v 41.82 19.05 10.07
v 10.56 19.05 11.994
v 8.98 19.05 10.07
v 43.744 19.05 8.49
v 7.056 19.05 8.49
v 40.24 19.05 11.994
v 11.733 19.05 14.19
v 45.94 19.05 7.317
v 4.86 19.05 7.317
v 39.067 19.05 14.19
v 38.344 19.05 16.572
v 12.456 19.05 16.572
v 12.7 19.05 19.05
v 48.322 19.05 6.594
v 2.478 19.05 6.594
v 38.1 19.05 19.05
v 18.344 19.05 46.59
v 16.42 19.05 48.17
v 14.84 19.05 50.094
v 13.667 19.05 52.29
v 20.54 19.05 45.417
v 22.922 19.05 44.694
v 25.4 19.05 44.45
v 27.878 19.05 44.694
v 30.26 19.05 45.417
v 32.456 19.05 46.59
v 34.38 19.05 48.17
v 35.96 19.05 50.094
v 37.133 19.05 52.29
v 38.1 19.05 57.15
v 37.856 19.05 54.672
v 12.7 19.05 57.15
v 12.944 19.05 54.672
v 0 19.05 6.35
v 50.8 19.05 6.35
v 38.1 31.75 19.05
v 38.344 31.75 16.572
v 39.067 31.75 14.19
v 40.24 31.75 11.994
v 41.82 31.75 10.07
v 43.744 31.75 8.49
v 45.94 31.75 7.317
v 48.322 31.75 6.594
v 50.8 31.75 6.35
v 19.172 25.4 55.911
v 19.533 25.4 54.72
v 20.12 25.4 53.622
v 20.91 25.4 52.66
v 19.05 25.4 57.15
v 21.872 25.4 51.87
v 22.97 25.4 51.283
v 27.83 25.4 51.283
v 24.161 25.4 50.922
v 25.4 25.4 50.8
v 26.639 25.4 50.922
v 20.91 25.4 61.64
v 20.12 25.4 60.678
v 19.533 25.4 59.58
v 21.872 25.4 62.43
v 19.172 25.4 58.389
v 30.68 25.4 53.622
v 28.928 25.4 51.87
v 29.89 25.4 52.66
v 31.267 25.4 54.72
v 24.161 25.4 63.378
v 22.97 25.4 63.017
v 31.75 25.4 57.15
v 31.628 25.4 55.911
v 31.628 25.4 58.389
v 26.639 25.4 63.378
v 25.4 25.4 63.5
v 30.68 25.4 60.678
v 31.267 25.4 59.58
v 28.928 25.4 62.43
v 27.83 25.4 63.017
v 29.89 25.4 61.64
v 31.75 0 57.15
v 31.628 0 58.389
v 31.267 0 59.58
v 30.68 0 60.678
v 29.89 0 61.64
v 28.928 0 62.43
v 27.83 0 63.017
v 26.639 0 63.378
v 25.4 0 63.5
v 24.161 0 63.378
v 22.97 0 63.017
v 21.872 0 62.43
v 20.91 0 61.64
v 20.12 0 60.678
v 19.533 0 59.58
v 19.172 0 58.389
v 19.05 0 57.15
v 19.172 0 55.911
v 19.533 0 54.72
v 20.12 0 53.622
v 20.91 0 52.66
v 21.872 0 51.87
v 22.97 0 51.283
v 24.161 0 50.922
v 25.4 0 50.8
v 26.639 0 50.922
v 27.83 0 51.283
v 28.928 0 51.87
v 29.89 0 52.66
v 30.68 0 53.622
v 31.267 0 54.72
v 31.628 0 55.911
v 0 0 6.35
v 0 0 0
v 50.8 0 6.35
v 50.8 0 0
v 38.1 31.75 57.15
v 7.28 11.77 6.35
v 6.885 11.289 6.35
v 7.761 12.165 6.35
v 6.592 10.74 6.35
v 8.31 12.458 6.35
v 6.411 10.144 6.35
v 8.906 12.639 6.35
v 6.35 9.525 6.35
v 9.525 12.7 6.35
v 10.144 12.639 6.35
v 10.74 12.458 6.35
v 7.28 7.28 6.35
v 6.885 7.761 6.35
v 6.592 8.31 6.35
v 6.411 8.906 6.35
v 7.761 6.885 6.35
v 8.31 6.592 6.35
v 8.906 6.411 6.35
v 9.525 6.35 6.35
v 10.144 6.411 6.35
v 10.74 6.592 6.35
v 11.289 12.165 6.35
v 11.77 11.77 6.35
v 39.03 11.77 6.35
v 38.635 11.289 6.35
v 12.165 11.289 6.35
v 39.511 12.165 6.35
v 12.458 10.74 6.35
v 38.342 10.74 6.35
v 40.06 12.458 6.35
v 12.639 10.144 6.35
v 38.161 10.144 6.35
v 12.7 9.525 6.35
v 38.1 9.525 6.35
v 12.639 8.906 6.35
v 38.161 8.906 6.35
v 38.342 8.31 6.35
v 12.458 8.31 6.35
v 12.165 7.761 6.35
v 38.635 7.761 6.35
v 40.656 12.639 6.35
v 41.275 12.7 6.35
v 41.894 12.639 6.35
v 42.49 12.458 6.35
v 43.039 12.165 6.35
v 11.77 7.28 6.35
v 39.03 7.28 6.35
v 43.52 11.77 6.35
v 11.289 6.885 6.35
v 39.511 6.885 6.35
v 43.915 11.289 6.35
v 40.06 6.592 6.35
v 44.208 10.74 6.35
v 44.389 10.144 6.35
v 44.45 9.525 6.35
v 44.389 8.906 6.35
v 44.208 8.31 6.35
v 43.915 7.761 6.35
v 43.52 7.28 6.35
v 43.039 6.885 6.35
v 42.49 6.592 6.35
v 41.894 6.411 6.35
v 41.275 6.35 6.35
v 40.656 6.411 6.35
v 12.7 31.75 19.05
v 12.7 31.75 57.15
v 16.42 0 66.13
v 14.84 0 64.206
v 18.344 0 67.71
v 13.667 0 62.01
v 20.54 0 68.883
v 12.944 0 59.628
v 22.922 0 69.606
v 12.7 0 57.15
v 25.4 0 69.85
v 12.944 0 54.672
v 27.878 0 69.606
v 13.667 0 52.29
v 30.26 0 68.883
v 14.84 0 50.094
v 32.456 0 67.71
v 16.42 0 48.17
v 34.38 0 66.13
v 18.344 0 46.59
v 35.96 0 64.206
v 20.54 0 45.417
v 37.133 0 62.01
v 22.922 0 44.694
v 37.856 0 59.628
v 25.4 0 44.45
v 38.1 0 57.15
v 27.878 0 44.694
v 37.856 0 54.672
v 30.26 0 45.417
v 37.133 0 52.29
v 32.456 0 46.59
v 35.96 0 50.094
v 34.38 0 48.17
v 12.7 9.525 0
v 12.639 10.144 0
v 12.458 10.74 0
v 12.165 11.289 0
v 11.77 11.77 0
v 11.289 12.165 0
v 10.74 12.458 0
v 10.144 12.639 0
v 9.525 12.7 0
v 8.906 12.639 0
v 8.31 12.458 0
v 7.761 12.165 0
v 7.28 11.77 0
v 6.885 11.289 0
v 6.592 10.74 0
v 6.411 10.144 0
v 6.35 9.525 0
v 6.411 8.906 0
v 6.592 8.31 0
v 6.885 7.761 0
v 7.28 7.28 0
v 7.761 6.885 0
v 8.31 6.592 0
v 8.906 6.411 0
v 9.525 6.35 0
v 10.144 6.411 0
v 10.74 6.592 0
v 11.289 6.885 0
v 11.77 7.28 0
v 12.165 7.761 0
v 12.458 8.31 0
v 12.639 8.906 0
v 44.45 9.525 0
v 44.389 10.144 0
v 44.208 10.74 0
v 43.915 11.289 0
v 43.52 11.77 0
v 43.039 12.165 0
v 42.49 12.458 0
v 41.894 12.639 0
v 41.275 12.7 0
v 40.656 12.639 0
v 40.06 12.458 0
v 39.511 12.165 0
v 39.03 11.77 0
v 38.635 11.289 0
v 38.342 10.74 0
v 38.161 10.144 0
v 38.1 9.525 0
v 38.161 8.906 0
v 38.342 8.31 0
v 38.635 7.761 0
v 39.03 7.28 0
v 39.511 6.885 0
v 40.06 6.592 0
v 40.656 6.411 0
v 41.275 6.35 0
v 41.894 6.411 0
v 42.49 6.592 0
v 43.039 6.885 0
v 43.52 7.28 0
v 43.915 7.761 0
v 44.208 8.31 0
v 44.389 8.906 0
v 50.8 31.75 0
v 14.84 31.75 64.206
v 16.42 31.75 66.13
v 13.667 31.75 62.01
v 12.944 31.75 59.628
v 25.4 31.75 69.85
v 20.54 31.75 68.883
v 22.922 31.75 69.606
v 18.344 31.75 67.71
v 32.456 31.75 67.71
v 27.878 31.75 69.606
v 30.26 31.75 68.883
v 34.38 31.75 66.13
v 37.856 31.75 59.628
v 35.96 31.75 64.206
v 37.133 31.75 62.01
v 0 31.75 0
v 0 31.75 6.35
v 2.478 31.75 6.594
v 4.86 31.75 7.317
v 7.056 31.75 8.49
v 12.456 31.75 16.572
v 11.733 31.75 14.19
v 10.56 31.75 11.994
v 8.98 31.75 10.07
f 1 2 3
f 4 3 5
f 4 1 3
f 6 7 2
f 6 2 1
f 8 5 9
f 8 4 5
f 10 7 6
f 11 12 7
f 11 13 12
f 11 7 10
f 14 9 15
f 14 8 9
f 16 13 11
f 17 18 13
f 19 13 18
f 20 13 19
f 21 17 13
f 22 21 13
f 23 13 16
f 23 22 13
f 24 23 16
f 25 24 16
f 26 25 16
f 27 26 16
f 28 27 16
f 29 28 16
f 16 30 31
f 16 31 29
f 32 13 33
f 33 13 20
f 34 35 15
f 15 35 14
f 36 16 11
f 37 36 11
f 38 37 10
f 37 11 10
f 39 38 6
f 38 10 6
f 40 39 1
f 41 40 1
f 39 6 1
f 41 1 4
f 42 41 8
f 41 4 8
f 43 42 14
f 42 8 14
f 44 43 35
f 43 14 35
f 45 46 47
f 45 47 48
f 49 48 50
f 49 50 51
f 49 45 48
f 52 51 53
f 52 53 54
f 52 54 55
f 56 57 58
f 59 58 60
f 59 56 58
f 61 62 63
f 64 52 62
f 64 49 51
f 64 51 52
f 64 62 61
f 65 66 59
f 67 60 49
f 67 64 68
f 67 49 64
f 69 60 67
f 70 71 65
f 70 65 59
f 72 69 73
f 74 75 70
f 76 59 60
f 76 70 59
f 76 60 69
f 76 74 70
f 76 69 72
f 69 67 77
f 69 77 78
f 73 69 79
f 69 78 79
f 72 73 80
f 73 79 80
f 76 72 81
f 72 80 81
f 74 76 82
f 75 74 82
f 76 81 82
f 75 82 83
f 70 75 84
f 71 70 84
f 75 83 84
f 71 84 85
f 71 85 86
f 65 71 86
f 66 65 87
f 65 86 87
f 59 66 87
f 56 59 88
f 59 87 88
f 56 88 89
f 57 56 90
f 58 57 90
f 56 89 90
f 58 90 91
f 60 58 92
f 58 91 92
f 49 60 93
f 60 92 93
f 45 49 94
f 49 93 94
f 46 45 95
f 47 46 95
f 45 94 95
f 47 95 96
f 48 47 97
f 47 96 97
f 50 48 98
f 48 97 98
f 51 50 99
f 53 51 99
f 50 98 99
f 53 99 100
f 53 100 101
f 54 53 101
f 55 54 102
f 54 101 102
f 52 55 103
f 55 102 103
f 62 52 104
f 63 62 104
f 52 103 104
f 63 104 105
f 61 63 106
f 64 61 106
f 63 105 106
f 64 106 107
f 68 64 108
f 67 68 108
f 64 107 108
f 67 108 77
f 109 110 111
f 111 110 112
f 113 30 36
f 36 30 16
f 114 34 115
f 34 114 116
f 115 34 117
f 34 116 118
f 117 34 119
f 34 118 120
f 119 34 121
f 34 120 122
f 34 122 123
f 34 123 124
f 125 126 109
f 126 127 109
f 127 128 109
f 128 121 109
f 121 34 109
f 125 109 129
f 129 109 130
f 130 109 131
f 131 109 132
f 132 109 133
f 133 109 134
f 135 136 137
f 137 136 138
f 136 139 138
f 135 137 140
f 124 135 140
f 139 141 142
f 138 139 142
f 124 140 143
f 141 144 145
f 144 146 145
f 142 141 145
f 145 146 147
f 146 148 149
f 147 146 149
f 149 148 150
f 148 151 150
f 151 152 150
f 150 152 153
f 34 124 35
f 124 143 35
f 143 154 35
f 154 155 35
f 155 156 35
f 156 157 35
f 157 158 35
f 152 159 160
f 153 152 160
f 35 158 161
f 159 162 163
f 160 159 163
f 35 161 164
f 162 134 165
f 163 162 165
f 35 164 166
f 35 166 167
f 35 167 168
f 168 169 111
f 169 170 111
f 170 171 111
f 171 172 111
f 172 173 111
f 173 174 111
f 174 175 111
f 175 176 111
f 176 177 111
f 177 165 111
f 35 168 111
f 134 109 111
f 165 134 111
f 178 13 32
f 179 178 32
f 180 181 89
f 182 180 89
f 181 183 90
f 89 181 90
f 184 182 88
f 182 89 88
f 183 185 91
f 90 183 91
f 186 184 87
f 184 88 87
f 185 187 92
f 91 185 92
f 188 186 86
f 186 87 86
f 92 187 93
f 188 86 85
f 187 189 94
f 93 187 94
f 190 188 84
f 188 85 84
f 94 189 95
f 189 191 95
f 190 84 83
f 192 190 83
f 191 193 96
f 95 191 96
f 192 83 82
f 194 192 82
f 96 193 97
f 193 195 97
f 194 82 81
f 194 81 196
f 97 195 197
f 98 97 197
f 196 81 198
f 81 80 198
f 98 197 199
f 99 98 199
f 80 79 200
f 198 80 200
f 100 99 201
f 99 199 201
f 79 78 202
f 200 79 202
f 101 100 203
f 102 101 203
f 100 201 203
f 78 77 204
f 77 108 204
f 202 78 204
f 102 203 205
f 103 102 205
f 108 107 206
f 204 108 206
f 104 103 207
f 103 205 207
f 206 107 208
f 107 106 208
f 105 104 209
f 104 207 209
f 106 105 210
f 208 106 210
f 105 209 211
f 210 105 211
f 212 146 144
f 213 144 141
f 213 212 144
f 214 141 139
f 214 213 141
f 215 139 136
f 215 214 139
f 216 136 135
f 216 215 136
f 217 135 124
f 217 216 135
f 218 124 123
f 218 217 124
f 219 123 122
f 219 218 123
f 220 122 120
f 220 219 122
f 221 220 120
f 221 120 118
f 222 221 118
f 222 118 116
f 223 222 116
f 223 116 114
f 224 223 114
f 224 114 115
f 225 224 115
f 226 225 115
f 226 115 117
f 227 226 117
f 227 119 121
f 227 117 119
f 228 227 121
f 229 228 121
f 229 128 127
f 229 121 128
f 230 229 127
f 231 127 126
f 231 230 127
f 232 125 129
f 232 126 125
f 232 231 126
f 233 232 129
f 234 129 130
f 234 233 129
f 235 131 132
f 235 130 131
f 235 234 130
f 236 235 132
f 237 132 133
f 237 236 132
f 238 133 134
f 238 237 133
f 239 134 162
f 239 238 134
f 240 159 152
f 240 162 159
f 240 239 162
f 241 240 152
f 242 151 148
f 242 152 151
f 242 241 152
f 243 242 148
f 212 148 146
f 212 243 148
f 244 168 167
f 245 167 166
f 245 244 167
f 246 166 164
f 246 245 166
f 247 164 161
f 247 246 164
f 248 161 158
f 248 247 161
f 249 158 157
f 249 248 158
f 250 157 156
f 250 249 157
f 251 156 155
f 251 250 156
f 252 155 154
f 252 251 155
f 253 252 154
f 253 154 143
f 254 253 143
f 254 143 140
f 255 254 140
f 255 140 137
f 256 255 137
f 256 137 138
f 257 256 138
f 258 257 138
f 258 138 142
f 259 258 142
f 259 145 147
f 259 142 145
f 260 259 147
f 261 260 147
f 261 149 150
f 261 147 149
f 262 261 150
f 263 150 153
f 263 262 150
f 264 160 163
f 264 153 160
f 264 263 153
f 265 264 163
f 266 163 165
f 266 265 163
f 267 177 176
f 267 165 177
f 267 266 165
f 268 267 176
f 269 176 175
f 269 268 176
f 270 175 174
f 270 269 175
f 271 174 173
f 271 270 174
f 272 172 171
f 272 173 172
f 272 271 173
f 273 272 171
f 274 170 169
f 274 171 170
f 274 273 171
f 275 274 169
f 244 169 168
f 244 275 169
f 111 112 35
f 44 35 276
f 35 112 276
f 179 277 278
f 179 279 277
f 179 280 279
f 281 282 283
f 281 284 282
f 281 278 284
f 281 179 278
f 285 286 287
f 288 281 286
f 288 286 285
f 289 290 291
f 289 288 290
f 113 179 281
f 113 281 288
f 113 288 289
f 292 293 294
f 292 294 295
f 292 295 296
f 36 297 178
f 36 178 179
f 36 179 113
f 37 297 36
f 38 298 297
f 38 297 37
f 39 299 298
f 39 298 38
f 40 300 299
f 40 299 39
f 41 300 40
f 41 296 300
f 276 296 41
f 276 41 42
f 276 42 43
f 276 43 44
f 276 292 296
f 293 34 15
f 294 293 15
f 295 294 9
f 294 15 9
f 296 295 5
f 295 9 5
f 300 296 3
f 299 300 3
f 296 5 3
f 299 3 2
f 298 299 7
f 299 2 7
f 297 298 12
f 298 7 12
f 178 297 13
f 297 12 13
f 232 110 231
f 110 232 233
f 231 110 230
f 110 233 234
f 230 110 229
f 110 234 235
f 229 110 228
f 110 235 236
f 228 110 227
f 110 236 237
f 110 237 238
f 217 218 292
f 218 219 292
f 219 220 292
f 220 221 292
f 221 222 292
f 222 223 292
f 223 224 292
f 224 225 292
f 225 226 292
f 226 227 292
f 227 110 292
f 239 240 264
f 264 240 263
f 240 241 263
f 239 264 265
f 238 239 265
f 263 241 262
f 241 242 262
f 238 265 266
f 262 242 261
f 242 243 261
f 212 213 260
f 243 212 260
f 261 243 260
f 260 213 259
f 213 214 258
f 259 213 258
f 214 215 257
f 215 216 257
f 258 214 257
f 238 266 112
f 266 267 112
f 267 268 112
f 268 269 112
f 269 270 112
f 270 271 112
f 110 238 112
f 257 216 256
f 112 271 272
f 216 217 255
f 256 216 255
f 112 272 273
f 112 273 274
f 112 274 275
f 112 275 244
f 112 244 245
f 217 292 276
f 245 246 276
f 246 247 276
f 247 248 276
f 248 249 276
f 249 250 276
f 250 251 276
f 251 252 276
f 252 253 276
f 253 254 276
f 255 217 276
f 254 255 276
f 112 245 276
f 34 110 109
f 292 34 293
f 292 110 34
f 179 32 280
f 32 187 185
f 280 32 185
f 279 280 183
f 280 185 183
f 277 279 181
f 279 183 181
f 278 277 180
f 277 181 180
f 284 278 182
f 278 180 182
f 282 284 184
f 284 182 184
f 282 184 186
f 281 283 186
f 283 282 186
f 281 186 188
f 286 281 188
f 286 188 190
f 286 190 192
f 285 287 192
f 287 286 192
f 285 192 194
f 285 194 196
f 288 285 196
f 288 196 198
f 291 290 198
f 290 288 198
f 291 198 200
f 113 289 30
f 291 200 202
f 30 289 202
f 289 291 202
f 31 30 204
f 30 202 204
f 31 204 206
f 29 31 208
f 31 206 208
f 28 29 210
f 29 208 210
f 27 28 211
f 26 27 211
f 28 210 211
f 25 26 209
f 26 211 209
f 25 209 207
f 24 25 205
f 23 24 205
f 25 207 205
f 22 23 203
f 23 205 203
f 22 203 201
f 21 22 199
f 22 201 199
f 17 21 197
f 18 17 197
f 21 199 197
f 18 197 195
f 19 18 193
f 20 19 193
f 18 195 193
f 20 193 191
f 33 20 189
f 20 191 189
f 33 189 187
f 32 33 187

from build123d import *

# Parameters (mm, degrees)
F0_W      = 50.8
F0_H      = 31.75
F1_DEPTH  = 69.85
F2_W      = 50.8
F2_H      = 38.1
F3_DEPTH  = 19.05
F5_DEPTH  = 19.05
F6_R      = 6.35
F8_DEPTH  = 25.4
F9_R      = 3.175
F10_DEPTH = 19.05


with BuildPart() as f1:
    # F0 (on Top) → F1 (new body)
    with BuildSketch(Plane.XY):
        with Locations((25.4, 15.875)):
            Rectangle(F0_W, F0_H)
    extrude(amount=F1_DEPTH)

    # F2 (on face) → F3 (cut)
    with BuildSketch(Plane.XZ):
        with Locations((25.4, 25.4)):
            Rectangle(F2_W, F2_H)
    extrude(amount=-F3_DEPTH, mode=Mode.SUBTRACT)

    # F4 (on face) → F5 (cut)
    with BuildSketch(Plane.XZ):
        with BuildLine():
            ThreePointArc((12.7, 57.15), (16.4197438789, 66.1302561211), (25.4, 69.85))
            Line((25.4, 69.85), (0, 69.85))
            Line((0, 69.85), (0, 44.45))
            Line((0, 44.45), (12.7, 44.45))
            Line((12.7, 44.45), (12.7, 57.15))
        make_face()
        with BuildLine():
            ThreePointArc((25.4, 69.85), (34.3802561211, 66.1302561211), (38.1, 57.15))
            Line((38.1, 57.15), (38.1, 44.45))
            Line((38.1, 44.45), (50.8, 44.45))
            Line((50.8, 44.45), (50.8, 69.85))
            Line((50.8, 69.85), (25.4, 69.85))
        make_face()
        with BuildLine():
            Line((38.1, 44.45), (38.1, 57.15))
            ThreePointArc((38.1, 57.15), (34.3802561211, 48.1697438789), (25.4, 44.45))
            Line((25.4, 44.45), (38.1, 44.45))
        make_face()
        with BuildLine():
            Line((12.7, 44.45), (25.4, 44.45))
            ThreePointArc((25.4, 44.45), (16.4197438789, 48.1697438789), (12.7, 57.15))
            Line((12.7, 57.15), (12.7, 44.45))
        make_face()
    extrude(amount=-F5_DEPTH, mode=Mode.SUBTRACT)

    # F7 (on face) + F6 (on face) → F8 (cut)
    with BuildSketch(Plane.XZ.offset(-19.05)):
        with BuildLine():
            ThreePointArc((25.4, 69.85), (34.3802561211, 66.1302561211), (38.1, 57.15))
            Line((38.1, 57.15), (38.1, 19.05))
            ThreePointArc((38.1, 19.05), (41.8197438789, 10.0697438789), (50.8, 6.35))
            Line((50.8, 6.35), (50.8, 69.85))
            Line((50.8, 69.85), (25.4, 69.85))
        make_face()
        with BuildLine():
            Line((12.7, 19.05), (12.7, 57.15))
            ThreePointArc((12.7, 57.15), (16.4197438789, 66.1302561211), (25.4, 69.85))
            Line((25.4, 69.85), (0, 69.85))
            Line((0, 69.85), (0, 6.35))
            ThreePointArc((0, 6.35), (8.9802561211, 10.0697438789), (12.7, 19.05))
        make_face()
    with BuildSketch(Plane.XZ):
        with Locations((25.4, 57.15)):
            Circle(F6_R)
    extrude(amount=-F8_DEPTH, mode=Mode.SUBTRACT)

    # F9 (on Top) → F10 (cut)
    with BuildSketch(Plane.XY):
        with Locations((41.275, 9.525)):
            Circle(F9_R)
        with Locations((9.525, 9.525)):
            Circle(F9_R)
    extrude(amount=F10_DEPTH, mode=Mode.SUBTRACT)


solid = f1.part
